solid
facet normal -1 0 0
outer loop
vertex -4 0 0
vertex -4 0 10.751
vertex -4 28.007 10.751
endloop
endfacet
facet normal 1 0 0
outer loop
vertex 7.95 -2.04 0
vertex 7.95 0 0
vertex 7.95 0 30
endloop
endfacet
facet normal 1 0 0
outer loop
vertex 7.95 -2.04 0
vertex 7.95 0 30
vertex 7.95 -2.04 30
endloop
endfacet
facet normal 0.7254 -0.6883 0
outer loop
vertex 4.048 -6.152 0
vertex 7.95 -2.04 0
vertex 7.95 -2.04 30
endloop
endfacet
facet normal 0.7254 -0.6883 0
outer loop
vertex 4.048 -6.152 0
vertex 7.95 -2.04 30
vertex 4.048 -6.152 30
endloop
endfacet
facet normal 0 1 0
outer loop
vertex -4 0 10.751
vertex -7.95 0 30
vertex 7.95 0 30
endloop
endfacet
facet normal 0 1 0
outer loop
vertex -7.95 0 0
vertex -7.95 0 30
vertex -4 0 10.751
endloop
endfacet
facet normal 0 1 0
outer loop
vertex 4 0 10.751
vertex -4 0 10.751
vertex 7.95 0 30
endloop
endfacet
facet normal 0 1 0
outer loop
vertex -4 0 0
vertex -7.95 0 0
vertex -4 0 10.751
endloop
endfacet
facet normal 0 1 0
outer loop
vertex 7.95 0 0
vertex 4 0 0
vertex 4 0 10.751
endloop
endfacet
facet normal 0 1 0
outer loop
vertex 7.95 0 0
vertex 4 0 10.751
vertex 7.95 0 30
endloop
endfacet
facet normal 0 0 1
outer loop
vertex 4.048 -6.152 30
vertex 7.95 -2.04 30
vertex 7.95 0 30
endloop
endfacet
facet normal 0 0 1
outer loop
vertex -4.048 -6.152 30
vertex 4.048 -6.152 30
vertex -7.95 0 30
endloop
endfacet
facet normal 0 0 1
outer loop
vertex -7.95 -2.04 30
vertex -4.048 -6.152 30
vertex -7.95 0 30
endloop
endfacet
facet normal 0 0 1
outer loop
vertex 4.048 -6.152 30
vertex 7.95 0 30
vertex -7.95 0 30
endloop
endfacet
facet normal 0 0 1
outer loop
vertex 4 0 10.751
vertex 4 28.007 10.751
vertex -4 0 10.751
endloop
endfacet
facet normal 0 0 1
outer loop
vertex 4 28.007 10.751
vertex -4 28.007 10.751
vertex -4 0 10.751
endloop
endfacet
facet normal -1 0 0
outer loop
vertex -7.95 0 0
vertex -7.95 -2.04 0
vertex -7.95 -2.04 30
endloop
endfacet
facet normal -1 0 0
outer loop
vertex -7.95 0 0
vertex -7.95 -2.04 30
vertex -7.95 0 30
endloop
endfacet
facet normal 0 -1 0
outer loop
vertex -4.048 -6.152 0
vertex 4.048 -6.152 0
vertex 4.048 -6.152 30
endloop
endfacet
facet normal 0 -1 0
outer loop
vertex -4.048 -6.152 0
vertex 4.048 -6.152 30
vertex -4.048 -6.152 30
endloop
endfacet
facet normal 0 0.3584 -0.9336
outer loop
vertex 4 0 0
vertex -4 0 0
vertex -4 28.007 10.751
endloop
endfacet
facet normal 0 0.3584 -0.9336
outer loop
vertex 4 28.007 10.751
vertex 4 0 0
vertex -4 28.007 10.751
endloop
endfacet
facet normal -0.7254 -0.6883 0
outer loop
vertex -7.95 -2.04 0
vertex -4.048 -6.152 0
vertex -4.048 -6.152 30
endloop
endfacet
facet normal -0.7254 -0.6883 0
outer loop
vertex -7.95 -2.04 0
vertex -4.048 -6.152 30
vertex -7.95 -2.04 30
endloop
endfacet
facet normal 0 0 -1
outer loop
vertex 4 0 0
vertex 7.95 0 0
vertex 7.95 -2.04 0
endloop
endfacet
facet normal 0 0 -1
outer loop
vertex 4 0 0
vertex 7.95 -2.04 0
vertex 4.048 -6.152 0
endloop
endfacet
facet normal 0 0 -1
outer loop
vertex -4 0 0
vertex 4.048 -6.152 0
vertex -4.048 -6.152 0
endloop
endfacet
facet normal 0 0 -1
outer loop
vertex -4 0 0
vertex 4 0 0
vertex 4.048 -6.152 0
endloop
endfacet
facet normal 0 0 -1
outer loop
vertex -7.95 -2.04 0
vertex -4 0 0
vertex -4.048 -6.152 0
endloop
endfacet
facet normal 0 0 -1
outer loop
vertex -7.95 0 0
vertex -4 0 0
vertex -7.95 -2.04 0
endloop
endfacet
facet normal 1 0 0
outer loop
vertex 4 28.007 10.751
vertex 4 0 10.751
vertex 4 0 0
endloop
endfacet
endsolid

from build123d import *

# Parameters (mm, degrees)
BOSS_EXTRUDE1_DEPTH = 30
BOSS_EXTRUDE3_DEPTH = 4


with BuildPart() as part:
    # Sketch1 → Boss-Extrude1 (new body)
    with BuildSketch(Plane.XY):
        Polygon((7.95, 0), (7.95, -2.04), (4.048, -6.152414984), (-4.048, -6.152414984), (-7.95, -2.04), (-7.95, 0), align=None)
    extrude(amount=BOSS_EXTRUDE1_DEPTH)

    # Sketch2 → Boss-Extrude3 (add, symmetric)
    with BuildSketch(Plane.ZY):
        Polygon((0, 0), (10.751038486, 28.007412795), (10.751038486, 0), align=None)
    extrude(amount=BOSS_EXTRUDE3_DEPTH, both=True)


solid = part.part
